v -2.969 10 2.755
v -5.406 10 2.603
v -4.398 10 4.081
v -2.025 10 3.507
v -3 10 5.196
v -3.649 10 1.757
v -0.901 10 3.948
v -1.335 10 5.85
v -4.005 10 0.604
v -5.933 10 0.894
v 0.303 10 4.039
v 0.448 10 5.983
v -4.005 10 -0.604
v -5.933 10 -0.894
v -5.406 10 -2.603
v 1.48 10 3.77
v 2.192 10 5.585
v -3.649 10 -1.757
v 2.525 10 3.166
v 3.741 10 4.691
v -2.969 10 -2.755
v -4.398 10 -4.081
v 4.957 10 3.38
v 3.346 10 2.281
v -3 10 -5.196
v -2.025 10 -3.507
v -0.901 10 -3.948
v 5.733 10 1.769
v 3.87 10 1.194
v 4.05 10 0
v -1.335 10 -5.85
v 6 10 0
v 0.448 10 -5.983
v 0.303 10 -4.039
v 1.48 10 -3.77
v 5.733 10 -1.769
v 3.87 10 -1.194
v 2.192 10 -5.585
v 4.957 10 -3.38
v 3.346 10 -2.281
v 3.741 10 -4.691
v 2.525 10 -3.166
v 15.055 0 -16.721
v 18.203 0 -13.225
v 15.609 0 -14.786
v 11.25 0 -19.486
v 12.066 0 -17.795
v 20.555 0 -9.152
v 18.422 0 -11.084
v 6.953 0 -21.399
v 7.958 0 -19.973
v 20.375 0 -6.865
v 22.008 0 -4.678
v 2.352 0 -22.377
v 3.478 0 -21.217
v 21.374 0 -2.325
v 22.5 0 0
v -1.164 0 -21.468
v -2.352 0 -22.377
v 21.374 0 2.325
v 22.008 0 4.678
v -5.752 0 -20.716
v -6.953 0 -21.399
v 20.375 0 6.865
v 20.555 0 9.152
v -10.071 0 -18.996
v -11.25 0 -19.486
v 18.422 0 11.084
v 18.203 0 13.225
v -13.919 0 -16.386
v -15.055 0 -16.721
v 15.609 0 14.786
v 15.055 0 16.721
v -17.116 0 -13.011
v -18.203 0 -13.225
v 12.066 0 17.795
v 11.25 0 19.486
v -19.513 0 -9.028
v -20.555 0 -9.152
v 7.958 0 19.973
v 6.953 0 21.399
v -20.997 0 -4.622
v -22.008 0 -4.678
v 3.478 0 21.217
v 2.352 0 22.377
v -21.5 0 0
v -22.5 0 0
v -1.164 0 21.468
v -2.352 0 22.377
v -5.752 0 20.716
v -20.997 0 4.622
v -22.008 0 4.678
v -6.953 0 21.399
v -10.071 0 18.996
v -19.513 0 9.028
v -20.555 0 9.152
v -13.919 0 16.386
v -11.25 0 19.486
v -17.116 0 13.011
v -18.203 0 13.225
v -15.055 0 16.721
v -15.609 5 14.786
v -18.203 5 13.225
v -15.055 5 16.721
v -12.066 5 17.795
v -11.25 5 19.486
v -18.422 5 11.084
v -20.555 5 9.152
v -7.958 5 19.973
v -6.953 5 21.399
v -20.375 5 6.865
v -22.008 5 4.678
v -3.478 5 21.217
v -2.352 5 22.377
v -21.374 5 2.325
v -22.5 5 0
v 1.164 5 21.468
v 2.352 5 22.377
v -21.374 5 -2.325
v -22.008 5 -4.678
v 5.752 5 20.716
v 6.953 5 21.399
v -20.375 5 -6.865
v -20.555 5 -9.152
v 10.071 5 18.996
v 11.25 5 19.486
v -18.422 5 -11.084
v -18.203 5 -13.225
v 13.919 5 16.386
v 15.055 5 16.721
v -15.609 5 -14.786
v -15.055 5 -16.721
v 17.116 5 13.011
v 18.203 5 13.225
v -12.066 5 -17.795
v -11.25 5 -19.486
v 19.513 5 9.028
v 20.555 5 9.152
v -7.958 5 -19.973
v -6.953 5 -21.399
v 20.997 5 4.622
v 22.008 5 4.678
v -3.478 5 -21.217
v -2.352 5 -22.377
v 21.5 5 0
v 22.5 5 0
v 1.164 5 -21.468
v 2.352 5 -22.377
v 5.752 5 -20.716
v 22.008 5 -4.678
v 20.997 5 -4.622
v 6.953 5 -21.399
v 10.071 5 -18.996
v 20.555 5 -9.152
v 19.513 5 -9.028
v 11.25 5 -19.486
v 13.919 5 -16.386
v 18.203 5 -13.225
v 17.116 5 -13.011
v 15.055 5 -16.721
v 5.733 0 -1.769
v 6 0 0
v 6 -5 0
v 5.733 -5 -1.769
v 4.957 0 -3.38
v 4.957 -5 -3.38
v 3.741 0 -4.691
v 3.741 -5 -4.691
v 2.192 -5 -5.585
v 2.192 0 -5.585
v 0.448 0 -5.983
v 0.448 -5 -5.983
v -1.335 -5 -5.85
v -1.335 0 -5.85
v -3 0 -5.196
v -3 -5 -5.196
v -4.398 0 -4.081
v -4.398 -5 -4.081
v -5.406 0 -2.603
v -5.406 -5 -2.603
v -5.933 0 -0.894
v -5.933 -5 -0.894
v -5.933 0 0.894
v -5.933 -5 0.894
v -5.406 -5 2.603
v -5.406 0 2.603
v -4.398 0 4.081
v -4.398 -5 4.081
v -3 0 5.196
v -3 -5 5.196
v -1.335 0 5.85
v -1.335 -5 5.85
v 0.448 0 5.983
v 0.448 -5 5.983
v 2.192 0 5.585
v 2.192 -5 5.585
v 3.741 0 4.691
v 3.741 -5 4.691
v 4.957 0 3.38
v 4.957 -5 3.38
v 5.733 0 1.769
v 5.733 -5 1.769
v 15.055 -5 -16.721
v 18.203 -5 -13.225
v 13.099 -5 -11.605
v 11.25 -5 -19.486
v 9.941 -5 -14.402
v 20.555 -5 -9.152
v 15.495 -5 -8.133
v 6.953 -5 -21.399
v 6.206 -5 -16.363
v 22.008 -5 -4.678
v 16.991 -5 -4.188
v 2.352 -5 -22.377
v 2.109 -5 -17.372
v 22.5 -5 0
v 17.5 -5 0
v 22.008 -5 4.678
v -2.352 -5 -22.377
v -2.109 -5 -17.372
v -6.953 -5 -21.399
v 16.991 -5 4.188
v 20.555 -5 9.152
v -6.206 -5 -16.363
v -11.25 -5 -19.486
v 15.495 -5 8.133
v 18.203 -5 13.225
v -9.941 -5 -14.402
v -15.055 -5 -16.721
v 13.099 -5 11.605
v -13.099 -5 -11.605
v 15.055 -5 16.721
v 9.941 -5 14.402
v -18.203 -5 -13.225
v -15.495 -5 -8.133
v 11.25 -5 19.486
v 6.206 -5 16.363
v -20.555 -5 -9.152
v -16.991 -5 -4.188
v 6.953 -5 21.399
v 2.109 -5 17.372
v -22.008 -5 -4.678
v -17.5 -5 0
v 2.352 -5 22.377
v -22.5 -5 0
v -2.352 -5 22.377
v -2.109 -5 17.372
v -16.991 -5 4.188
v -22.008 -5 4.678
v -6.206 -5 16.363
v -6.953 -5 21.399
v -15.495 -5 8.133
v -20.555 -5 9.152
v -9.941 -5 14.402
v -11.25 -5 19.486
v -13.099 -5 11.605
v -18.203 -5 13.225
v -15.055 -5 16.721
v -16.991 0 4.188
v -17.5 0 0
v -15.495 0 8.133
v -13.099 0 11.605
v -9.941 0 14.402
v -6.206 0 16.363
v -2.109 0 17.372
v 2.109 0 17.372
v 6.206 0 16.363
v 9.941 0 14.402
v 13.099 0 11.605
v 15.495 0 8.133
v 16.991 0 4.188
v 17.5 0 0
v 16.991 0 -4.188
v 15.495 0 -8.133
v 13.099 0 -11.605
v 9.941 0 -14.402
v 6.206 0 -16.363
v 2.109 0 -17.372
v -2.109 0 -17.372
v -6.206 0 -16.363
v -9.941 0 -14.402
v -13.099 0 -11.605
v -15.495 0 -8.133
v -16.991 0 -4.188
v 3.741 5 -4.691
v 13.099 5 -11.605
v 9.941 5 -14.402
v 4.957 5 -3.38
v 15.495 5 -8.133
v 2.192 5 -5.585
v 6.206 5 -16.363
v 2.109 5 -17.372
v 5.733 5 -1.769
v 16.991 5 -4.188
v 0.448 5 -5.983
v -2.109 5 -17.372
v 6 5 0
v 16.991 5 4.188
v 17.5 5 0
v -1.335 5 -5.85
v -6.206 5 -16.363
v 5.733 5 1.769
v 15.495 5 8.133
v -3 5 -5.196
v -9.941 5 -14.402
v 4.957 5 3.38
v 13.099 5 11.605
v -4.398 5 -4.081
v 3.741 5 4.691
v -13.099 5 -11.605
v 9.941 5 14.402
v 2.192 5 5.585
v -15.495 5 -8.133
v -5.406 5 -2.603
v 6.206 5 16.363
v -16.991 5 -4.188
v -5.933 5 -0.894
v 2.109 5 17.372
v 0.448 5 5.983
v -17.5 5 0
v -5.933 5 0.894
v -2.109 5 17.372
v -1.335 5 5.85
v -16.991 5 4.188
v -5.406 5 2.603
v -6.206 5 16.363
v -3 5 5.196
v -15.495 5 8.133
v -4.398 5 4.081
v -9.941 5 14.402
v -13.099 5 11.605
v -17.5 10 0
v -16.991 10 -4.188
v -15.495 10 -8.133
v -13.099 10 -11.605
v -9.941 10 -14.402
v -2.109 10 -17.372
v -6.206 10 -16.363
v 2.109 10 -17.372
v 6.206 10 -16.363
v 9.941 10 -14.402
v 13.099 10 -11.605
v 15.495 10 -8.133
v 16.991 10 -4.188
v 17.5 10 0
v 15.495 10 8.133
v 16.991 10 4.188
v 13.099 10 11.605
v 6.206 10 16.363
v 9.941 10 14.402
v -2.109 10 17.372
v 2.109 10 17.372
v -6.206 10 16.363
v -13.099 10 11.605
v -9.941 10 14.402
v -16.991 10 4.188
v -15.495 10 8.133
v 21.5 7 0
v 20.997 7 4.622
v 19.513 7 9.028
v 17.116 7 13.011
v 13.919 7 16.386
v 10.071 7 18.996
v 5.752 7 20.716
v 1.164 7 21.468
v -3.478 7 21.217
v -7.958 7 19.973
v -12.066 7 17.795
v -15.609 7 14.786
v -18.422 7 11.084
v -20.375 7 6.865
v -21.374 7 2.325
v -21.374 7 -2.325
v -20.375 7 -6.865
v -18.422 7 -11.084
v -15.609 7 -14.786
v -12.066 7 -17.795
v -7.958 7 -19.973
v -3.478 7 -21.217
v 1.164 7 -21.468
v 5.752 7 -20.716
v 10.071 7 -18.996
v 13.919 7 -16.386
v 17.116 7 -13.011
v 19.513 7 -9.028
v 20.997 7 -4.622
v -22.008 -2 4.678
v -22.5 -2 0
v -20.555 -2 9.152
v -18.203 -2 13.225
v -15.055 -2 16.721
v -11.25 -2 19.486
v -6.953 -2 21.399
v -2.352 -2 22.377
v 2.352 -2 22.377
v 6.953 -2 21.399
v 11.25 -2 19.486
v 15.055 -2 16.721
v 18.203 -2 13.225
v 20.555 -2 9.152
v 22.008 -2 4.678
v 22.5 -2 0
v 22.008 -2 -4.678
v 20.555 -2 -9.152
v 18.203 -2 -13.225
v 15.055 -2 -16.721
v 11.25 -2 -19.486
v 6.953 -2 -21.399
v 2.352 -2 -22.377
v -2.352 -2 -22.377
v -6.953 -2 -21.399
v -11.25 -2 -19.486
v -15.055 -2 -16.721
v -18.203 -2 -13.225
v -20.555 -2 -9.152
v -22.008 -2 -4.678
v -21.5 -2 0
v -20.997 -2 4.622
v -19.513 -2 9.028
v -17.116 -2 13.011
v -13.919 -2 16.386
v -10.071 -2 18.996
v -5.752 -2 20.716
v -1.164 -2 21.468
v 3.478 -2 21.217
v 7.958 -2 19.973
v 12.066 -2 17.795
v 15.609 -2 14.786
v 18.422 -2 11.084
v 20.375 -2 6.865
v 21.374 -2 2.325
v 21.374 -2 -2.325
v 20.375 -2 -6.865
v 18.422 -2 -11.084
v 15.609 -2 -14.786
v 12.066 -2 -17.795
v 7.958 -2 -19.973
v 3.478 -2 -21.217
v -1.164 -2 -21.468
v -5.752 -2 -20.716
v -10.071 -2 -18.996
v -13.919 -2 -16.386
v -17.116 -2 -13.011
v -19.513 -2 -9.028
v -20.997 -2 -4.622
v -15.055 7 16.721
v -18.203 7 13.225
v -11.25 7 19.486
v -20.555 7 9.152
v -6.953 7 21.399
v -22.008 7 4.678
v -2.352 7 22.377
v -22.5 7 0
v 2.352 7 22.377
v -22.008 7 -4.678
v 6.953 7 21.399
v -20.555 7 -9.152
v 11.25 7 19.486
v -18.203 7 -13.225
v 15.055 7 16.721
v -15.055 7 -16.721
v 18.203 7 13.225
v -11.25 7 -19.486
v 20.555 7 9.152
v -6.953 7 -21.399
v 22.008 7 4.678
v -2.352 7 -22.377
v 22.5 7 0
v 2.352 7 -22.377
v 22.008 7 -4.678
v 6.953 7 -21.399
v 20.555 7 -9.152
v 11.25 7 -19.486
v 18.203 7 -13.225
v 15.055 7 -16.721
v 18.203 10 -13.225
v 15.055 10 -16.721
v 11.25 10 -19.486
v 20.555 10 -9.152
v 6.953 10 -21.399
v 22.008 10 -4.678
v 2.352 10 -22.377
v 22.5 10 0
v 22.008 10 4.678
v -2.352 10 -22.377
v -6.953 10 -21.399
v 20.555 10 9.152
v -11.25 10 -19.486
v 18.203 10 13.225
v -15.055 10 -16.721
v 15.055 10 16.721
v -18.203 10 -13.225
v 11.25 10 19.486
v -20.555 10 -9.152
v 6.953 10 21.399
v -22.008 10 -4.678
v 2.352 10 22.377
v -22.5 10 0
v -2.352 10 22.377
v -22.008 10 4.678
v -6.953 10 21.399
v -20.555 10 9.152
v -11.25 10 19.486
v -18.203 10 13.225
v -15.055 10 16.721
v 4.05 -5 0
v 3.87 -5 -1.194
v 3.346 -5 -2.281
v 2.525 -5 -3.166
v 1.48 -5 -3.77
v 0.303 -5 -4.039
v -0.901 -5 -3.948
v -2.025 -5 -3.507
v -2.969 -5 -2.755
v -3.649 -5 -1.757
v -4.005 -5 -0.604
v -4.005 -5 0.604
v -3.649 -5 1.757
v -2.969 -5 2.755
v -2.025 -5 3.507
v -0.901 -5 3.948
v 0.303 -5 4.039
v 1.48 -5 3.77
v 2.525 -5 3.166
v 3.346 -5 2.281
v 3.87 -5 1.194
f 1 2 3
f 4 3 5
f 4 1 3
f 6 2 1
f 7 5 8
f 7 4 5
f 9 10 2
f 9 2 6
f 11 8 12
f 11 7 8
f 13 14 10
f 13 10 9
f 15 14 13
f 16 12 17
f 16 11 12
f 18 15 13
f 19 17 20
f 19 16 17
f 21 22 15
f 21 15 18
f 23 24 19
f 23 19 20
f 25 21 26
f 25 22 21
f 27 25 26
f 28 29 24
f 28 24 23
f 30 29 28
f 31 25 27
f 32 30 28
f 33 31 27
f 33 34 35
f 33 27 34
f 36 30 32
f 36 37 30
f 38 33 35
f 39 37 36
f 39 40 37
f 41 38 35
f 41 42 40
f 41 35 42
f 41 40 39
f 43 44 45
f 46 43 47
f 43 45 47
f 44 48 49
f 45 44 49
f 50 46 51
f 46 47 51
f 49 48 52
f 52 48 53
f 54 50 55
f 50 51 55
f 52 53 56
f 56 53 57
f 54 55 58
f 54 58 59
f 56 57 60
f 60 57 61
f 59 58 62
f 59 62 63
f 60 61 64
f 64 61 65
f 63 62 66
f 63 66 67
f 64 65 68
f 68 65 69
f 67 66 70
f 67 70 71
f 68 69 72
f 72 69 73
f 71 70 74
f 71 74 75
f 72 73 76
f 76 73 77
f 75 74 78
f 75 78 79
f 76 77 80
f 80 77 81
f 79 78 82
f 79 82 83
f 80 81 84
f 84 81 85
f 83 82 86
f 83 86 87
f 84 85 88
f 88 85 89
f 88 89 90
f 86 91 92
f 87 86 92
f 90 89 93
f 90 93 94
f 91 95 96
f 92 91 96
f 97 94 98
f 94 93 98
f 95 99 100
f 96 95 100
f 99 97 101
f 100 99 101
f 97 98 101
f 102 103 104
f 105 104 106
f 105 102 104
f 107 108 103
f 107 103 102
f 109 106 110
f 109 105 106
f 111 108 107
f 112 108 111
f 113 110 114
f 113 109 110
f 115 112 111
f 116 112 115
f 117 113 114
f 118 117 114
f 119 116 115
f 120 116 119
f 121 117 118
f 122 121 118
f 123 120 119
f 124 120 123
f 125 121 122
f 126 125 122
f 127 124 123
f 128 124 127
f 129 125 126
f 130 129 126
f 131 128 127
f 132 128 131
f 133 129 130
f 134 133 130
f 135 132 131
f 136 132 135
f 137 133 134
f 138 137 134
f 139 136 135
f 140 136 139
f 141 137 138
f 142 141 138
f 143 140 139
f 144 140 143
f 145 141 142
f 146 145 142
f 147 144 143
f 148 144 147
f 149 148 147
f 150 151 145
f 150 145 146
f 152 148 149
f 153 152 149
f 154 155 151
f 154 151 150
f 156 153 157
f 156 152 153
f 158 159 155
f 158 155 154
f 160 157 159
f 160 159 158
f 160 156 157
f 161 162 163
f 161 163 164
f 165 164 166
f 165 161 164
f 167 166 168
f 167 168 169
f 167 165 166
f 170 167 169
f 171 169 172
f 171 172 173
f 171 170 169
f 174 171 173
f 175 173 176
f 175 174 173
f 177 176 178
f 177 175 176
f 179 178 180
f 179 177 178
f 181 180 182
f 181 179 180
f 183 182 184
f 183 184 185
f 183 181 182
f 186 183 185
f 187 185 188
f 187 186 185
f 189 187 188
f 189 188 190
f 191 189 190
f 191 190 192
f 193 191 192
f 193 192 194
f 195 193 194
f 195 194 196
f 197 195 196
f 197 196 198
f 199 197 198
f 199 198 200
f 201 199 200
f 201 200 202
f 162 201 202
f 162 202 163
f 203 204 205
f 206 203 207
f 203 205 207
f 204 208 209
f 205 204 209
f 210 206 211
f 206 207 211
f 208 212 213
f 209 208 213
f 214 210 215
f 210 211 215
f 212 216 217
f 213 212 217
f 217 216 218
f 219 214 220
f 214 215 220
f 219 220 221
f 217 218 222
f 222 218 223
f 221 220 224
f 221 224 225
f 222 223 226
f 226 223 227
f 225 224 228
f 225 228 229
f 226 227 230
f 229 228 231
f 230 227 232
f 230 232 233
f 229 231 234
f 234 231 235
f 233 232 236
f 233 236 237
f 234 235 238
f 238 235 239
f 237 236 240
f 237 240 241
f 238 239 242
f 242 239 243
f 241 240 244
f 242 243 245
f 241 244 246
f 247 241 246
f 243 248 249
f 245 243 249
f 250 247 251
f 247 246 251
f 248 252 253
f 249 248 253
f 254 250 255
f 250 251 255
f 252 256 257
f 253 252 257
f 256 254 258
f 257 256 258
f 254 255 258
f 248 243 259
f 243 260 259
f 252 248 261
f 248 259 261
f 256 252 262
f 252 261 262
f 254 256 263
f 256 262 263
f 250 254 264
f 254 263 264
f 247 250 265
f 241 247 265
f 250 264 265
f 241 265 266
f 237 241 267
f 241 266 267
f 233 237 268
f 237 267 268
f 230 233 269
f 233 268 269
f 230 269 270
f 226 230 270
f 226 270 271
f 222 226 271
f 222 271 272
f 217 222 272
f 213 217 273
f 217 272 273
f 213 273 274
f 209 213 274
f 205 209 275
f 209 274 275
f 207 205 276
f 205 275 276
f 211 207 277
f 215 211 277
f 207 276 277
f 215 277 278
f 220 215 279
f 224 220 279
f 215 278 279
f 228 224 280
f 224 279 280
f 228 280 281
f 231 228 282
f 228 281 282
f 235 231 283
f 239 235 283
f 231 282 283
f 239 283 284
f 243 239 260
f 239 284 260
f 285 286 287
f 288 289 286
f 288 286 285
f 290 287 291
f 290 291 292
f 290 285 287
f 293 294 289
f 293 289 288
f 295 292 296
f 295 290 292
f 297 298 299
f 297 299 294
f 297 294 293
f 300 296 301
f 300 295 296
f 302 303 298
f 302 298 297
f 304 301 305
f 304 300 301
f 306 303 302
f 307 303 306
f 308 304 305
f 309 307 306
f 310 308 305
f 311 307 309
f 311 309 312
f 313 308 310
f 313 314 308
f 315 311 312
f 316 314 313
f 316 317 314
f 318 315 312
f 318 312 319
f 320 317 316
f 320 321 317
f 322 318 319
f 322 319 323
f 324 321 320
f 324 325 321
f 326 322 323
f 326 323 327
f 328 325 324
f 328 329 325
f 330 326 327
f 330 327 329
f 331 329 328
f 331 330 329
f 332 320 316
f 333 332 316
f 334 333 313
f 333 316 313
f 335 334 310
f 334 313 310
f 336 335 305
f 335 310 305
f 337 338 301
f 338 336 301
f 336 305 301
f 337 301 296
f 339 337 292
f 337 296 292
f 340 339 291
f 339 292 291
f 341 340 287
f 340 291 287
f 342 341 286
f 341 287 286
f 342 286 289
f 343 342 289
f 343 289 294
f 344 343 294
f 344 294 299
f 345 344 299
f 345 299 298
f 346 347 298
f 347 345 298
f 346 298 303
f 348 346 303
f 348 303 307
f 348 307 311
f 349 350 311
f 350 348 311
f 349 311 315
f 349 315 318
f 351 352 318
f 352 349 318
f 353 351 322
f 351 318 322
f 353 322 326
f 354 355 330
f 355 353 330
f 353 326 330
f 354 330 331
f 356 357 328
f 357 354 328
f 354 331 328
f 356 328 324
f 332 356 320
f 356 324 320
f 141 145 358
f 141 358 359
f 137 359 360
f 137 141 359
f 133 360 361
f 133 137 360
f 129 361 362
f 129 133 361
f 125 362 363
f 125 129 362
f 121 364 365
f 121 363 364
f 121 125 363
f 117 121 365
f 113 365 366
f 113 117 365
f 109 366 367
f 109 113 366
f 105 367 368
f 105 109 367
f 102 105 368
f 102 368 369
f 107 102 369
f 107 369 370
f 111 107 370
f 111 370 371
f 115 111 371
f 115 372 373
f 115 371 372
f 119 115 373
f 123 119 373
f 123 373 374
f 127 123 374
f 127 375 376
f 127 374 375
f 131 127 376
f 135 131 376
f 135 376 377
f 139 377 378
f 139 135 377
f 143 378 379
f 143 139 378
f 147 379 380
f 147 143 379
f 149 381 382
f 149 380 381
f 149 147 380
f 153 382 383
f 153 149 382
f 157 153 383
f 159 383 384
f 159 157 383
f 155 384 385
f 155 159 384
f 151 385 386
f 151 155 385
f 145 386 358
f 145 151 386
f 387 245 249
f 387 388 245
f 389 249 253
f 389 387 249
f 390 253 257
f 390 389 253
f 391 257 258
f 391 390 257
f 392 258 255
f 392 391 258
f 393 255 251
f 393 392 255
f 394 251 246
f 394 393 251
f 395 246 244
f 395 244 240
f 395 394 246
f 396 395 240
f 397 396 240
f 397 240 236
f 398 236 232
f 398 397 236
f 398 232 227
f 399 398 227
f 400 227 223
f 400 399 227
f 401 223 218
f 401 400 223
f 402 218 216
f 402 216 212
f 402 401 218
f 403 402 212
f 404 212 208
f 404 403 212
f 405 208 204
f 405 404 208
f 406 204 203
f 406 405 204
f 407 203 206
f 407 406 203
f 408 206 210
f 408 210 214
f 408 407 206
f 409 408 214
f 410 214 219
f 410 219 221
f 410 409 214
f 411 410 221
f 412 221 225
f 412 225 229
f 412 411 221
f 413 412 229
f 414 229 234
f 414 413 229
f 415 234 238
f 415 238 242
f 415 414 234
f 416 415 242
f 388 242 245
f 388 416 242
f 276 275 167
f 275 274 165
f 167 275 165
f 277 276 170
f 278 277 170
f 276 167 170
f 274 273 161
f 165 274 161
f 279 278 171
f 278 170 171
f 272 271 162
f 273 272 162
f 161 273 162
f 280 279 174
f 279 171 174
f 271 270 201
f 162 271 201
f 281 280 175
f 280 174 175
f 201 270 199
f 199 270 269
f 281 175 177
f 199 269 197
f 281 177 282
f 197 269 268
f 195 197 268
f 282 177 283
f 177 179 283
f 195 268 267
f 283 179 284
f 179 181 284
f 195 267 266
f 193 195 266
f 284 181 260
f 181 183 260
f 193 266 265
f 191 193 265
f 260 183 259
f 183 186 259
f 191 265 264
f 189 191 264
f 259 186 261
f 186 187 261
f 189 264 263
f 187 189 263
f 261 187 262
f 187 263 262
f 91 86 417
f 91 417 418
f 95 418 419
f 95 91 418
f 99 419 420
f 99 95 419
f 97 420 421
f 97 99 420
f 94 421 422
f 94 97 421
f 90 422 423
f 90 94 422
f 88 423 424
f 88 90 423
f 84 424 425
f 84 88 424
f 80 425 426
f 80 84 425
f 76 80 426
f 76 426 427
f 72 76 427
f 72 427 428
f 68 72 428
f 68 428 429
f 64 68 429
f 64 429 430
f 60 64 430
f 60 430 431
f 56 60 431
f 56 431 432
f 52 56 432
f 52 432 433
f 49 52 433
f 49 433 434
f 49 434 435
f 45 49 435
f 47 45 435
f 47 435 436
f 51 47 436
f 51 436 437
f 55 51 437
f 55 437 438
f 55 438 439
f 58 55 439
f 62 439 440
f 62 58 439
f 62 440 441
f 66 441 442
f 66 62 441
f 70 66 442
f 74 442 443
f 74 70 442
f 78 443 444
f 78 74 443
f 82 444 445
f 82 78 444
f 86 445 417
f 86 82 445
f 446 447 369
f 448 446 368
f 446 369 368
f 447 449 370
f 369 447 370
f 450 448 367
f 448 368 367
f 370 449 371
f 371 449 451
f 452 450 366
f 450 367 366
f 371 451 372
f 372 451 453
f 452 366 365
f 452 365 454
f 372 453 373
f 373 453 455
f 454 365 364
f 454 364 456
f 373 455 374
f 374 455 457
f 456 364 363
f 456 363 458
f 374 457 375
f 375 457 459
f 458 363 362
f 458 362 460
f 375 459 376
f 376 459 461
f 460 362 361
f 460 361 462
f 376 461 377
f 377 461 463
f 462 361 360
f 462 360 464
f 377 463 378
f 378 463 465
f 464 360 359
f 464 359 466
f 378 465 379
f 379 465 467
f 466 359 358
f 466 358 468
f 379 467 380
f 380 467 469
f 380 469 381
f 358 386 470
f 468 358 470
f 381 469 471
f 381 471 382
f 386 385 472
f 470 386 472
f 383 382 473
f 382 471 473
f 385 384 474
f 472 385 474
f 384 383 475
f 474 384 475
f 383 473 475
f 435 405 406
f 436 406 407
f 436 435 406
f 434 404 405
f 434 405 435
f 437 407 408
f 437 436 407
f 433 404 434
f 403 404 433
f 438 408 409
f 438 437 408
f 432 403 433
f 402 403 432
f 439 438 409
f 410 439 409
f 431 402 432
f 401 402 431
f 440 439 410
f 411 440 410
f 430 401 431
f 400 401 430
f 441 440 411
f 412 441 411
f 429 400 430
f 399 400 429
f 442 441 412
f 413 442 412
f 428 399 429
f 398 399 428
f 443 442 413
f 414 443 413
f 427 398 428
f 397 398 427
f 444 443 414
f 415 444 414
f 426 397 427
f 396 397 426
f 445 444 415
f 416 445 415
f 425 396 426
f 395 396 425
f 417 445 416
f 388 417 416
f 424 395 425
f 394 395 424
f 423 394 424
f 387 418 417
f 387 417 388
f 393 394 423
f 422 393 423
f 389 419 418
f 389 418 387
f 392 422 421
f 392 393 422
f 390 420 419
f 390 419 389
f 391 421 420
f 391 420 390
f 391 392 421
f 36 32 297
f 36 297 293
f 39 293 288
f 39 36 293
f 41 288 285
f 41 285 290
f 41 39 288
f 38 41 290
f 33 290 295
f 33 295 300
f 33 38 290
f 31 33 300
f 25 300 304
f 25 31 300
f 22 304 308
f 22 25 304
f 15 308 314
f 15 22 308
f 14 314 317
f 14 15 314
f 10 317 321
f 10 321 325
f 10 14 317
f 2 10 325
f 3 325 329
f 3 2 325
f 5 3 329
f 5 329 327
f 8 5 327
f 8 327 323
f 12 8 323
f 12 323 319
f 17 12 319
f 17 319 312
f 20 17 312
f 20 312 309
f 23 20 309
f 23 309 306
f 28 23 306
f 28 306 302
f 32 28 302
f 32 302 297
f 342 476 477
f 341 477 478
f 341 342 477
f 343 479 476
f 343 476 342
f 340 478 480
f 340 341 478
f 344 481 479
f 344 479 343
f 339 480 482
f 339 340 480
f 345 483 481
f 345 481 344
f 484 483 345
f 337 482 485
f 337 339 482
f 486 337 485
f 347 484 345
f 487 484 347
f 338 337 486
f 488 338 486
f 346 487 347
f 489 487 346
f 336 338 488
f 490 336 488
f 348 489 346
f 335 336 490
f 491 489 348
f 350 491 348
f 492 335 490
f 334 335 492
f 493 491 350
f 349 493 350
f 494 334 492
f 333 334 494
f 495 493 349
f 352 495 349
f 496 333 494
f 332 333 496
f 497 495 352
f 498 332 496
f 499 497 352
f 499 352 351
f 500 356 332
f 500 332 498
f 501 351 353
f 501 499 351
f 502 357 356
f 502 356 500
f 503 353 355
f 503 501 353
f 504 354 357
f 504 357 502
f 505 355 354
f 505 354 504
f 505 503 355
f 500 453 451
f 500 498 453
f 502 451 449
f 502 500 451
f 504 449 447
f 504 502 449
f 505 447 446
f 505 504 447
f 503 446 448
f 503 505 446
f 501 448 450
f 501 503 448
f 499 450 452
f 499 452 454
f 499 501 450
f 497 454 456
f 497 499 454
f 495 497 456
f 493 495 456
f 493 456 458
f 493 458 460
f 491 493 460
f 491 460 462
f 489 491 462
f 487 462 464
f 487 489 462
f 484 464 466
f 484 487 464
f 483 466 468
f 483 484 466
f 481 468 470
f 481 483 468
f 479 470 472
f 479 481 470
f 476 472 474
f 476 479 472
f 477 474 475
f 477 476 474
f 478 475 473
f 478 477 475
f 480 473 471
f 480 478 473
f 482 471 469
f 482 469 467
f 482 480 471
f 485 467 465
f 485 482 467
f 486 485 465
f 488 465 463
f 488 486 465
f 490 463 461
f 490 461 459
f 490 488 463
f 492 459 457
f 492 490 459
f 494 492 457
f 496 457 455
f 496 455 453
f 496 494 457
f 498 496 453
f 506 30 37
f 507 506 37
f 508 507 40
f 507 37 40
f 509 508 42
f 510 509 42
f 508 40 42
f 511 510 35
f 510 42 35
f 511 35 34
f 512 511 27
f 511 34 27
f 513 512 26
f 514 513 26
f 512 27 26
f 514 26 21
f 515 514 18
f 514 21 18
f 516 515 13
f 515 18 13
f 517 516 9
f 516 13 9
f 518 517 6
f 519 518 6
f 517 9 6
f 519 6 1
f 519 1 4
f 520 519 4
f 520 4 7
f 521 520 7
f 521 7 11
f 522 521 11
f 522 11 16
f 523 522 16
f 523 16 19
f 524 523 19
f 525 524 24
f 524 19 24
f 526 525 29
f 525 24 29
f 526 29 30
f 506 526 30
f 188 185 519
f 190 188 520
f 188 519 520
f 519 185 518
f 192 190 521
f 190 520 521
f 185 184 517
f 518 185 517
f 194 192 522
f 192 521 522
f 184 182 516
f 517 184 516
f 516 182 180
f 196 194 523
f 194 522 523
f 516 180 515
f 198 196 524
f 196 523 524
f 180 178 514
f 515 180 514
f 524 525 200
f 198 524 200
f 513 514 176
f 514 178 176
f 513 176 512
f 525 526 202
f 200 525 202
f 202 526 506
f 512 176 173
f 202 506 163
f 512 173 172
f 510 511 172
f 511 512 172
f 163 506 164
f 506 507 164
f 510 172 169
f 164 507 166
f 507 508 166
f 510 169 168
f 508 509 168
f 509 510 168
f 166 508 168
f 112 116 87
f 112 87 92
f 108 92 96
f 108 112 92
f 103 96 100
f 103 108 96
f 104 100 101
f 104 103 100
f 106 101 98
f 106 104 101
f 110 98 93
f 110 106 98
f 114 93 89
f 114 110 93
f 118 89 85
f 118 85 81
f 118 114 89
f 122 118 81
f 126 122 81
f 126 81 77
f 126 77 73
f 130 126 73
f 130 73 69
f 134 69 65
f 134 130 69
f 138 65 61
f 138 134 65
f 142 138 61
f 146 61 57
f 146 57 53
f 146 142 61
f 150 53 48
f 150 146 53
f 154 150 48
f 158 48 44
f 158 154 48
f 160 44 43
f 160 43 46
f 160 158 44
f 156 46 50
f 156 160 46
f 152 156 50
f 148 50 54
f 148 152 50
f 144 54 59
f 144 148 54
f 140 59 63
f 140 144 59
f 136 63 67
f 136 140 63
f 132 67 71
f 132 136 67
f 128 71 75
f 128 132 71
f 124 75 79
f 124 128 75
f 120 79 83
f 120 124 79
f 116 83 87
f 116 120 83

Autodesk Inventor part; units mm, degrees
ref_plane "YZ Plane" through (0, 0, 0) normal (1, 0, 0) x (0, 1, 0)
ref_plane "XZ Plane" through (0, 0, 0) normal (0, 1, 0) x (-1, 0, 0)
ref_plane "XY Plane" through (0, 0, 0) normal (0, 0, 1) x (1, 0, 0)
sketch "Sketch1" plane through (0, 0, 0) normal (0, 1, 0) x (-1, 0, 0)
  circle A0 centre (0, 0) radius 22.5
  circle A1 centre (0, 0) radius 2.55
  circle A2 centre (0, 0) radius 17.5
  circle A3 centre (0, 0) radius 21.5
  circle A4 centre (0, 0) radius 3.55
  dimension "d0" = 45
  dimension "d1" = 5.1
  dimension "d2" = 35
  dimension "d9" = 43
  dimension "d16" = 7.1
extrude "Extrusion1" add sketch "Sketch1" along normal blind 5 contours A2 | A4
extrude "Extrusion2" add sketch "Sketch1" along normal blind 10 contours A0 | A3
extrude "Extrusion3" add sketch "Sketch1" against normal blind 5 contours A0 | A3
extrude "Extrusion4" cut sketch "Sketch1" against normal blind 2 contours A0
sketch "Sketch2" plane through (0, 5, 0) normal (0, 1, 0) x (1, 0, 0)
  circle A0 centre (0, 0) radius 22.5
  circle A1 centre (0, 0) radius 21.5
  dimension "d12" = 45
  dimension "d13" = 43
extrude "Extrusion5" cut sketch "Sketch2" along normal blind 2
extrude "Extrusion6" add sketch "Sketch1" against normal blind 5 contours A4
extrude "Extrusion7" add sketch "Sketch1" along normal blind 10 contours A4
sketch "Sketch3" plane through (0, 10, 0) normal (0, 1, 0) x (1, 0, 0)
  circle A0 centre (0, 0) radius 4.05
  circle A1 centre (0, 0) radius 6
  dimension "d21" = 8.1
  dimension "d22" = 12
extrude "Extrusion8" add sketch "Sketch3" against normal blind 15
extrude "Extrusion9" cut sketch "Sketch3" against normal through all contours A0
properties part number "roller"
